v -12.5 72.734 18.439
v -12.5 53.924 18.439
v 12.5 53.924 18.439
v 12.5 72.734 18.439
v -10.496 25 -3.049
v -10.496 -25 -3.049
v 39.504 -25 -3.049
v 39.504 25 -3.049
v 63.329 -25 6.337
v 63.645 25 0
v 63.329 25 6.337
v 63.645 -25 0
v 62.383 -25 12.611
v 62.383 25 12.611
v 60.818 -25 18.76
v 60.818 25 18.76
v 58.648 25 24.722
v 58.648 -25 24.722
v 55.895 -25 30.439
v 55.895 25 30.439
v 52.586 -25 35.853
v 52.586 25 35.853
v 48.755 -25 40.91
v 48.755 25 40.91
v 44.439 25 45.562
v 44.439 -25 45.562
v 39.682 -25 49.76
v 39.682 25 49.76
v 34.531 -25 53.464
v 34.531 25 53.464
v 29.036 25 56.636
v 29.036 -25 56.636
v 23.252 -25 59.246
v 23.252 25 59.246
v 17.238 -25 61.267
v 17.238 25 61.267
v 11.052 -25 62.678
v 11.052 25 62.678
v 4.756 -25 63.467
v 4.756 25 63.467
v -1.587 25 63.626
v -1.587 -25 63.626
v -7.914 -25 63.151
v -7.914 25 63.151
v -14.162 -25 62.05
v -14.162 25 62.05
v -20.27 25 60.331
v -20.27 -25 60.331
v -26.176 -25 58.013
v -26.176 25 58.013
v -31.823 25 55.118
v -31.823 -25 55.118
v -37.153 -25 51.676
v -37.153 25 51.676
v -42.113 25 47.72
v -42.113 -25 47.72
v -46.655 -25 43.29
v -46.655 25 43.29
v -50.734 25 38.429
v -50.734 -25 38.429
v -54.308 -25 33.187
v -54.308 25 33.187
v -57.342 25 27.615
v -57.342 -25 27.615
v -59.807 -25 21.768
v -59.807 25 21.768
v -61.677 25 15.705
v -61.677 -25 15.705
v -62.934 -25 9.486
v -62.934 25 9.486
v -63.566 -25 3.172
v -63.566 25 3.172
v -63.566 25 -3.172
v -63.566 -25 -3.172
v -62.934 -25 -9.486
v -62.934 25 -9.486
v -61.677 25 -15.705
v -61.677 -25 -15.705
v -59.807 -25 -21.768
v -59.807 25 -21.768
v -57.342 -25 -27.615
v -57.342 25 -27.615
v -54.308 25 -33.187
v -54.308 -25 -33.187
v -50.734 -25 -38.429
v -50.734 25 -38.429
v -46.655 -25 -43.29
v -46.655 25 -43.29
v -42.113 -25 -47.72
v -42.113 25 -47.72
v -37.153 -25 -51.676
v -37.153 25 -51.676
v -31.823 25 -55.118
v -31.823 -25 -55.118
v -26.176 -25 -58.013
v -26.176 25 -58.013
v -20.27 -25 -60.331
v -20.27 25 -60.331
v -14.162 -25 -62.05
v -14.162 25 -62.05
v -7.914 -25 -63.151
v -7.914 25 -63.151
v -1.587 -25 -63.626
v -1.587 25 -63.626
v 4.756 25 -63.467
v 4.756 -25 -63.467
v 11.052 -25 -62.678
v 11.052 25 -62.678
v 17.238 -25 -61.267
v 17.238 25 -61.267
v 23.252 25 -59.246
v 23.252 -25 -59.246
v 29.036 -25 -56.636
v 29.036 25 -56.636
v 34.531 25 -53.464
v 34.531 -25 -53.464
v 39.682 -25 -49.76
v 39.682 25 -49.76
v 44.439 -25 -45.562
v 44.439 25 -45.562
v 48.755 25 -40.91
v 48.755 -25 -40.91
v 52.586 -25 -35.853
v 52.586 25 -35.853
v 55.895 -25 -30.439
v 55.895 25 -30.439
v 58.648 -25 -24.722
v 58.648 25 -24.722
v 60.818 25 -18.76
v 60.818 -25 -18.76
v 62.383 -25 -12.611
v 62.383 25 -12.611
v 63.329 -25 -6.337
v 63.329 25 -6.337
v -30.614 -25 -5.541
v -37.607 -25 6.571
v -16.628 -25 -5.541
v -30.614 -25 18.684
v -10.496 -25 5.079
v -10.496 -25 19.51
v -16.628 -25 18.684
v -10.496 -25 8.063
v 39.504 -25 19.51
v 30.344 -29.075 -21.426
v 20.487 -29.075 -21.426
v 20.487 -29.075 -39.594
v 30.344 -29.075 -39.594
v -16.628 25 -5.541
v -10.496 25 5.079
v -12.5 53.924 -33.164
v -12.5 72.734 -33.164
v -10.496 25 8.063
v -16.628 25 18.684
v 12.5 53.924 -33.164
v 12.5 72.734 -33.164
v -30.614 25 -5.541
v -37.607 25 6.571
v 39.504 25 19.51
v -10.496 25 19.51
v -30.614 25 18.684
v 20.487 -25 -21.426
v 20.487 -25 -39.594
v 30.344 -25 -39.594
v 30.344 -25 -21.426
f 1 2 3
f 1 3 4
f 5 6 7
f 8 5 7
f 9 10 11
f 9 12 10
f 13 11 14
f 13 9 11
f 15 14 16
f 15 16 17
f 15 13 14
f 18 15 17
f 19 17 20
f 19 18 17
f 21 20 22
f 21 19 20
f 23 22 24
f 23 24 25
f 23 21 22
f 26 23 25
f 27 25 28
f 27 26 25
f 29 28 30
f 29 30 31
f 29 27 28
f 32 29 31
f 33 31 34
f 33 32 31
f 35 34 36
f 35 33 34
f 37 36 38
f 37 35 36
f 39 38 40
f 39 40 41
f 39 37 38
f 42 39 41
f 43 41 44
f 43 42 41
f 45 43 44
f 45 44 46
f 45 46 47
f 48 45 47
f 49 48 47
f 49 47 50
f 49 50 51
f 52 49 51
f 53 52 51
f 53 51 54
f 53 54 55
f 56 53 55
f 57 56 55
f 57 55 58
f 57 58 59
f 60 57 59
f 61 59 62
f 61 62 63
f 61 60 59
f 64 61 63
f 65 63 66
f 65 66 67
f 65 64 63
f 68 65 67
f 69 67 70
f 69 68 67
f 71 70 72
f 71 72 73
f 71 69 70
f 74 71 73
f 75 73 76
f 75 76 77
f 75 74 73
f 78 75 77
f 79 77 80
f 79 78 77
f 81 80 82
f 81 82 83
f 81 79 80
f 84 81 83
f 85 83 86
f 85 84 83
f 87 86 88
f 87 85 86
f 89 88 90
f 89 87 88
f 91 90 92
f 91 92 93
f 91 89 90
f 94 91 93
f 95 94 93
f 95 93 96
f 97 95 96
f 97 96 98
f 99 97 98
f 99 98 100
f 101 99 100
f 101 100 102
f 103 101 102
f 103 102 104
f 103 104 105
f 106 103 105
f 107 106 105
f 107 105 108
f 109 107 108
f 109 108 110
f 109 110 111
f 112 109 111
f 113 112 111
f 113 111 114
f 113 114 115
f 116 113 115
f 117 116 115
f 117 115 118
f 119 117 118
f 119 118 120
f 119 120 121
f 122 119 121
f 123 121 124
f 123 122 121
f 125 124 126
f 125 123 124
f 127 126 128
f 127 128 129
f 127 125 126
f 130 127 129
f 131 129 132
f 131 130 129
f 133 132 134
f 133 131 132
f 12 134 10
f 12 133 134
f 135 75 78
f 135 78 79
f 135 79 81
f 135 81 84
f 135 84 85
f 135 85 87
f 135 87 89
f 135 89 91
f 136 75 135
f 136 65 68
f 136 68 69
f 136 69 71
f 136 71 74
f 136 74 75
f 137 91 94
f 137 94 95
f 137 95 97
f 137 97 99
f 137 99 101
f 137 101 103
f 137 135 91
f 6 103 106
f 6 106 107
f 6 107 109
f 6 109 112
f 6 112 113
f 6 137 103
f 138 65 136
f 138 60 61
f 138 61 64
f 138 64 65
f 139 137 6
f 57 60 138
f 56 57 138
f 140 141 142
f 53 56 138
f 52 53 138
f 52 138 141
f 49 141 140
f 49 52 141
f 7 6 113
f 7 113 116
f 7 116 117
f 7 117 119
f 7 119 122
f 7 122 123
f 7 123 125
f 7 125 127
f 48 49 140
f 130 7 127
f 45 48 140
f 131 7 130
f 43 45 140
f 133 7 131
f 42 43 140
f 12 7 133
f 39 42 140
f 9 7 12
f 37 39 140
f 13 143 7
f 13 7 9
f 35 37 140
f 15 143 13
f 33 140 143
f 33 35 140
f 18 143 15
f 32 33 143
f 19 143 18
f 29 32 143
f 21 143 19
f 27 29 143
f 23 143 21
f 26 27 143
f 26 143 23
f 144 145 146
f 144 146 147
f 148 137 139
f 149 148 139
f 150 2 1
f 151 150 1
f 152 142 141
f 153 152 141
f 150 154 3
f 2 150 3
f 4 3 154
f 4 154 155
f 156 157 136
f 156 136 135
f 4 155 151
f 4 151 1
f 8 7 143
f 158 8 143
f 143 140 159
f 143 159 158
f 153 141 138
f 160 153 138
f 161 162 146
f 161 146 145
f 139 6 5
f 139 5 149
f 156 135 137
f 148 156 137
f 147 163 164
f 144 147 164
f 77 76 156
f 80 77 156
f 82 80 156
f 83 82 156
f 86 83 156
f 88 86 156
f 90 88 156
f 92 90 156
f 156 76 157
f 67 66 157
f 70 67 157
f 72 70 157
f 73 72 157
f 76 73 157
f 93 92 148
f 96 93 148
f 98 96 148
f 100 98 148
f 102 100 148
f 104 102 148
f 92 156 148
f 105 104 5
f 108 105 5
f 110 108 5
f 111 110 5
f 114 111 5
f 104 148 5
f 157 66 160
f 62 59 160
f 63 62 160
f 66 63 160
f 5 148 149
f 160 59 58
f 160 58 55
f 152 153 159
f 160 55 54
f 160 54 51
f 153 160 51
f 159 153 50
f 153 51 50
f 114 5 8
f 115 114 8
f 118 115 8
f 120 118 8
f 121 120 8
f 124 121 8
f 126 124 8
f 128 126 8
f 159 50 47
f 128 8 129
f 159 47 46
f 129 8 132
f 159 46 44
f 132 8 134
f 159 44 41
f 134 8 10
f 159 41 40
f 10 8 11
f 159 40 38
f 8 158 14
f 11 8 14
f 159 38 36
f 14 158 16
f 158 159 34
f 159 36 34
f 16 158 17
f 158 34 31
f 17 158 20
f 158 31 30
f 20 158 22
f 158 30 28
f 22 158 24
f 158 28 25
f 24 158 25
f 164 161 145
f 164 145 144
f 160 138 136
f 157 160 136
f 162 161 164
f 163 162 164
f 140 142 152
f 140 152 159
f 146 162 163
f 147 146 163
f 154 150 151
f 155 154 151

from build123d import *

# Parameters (mm, degrees)
F0_R     = 63.645292
F1_DEPTH = 25
F2_W     = 50
F2_H     = 22.55842
F3_DEPTH = 100
F5_DEPTH = 60
F6_W     = 9.857446
F6_H     = 18.167863
F7_DEPTH = 4.075194
F8_W     = 18.80996
F8_H     = 51.602587
F9_DEPTH = 12.5


with BuildPart() as f1:
    # F0 (on Front) → F1 (new body, symmetric)
    with BuildSketch(Plane.XZ):
        Circle(F0_R)
    extrude(amount=F1_DEPTH, both=True)

    # F2 (on face) → F3 (cut)
    with BuildSketch(Plane.XZ.offset(25)):
        with Locations((14.503569, 8.230565)):
            Rectangle(F2_W, F2_H)
    extrude(amount=-F3_DEPTH, mode=Mode.SUBTRACT)

    # F4 (on face) → F5 (cut)
    with BuildSketch(Plane.XZ.offset(25)):
        Polygon((-16.628109, 18.683635), (-30.614219, 18.683635), (-37.607275, 6.571308), (-30.614219, -5.541019), (-16.628109, -5.541019), (-9.635054, 6.571308), align=None)
    extrude(amount=-F5_DEPTH, mode=Mode.SUBTRACT)


with BuildPart() as f7:
    # F6 (on face) → F7 (new body)
    with BuildSketch(Plane.XZ.offset(25)):
        with Locations((25.415629, -30.509575)):
            Rectangle(F6_W, F6_H)
    extrude(amount=F7_DEPTH)


with BuildPart() as f9:
    # F8 (on Right) → F9 (new body, symmetric)
    with BuildSketch(Plane.YZ):
        with Locations((63.328743, -7.36241)):
            Rectangle(F8_W, F8_H)
    extrude(amount=F9_DEPTH, both=True)


solid = Compound([f1.part, f7.part, f9.part])
